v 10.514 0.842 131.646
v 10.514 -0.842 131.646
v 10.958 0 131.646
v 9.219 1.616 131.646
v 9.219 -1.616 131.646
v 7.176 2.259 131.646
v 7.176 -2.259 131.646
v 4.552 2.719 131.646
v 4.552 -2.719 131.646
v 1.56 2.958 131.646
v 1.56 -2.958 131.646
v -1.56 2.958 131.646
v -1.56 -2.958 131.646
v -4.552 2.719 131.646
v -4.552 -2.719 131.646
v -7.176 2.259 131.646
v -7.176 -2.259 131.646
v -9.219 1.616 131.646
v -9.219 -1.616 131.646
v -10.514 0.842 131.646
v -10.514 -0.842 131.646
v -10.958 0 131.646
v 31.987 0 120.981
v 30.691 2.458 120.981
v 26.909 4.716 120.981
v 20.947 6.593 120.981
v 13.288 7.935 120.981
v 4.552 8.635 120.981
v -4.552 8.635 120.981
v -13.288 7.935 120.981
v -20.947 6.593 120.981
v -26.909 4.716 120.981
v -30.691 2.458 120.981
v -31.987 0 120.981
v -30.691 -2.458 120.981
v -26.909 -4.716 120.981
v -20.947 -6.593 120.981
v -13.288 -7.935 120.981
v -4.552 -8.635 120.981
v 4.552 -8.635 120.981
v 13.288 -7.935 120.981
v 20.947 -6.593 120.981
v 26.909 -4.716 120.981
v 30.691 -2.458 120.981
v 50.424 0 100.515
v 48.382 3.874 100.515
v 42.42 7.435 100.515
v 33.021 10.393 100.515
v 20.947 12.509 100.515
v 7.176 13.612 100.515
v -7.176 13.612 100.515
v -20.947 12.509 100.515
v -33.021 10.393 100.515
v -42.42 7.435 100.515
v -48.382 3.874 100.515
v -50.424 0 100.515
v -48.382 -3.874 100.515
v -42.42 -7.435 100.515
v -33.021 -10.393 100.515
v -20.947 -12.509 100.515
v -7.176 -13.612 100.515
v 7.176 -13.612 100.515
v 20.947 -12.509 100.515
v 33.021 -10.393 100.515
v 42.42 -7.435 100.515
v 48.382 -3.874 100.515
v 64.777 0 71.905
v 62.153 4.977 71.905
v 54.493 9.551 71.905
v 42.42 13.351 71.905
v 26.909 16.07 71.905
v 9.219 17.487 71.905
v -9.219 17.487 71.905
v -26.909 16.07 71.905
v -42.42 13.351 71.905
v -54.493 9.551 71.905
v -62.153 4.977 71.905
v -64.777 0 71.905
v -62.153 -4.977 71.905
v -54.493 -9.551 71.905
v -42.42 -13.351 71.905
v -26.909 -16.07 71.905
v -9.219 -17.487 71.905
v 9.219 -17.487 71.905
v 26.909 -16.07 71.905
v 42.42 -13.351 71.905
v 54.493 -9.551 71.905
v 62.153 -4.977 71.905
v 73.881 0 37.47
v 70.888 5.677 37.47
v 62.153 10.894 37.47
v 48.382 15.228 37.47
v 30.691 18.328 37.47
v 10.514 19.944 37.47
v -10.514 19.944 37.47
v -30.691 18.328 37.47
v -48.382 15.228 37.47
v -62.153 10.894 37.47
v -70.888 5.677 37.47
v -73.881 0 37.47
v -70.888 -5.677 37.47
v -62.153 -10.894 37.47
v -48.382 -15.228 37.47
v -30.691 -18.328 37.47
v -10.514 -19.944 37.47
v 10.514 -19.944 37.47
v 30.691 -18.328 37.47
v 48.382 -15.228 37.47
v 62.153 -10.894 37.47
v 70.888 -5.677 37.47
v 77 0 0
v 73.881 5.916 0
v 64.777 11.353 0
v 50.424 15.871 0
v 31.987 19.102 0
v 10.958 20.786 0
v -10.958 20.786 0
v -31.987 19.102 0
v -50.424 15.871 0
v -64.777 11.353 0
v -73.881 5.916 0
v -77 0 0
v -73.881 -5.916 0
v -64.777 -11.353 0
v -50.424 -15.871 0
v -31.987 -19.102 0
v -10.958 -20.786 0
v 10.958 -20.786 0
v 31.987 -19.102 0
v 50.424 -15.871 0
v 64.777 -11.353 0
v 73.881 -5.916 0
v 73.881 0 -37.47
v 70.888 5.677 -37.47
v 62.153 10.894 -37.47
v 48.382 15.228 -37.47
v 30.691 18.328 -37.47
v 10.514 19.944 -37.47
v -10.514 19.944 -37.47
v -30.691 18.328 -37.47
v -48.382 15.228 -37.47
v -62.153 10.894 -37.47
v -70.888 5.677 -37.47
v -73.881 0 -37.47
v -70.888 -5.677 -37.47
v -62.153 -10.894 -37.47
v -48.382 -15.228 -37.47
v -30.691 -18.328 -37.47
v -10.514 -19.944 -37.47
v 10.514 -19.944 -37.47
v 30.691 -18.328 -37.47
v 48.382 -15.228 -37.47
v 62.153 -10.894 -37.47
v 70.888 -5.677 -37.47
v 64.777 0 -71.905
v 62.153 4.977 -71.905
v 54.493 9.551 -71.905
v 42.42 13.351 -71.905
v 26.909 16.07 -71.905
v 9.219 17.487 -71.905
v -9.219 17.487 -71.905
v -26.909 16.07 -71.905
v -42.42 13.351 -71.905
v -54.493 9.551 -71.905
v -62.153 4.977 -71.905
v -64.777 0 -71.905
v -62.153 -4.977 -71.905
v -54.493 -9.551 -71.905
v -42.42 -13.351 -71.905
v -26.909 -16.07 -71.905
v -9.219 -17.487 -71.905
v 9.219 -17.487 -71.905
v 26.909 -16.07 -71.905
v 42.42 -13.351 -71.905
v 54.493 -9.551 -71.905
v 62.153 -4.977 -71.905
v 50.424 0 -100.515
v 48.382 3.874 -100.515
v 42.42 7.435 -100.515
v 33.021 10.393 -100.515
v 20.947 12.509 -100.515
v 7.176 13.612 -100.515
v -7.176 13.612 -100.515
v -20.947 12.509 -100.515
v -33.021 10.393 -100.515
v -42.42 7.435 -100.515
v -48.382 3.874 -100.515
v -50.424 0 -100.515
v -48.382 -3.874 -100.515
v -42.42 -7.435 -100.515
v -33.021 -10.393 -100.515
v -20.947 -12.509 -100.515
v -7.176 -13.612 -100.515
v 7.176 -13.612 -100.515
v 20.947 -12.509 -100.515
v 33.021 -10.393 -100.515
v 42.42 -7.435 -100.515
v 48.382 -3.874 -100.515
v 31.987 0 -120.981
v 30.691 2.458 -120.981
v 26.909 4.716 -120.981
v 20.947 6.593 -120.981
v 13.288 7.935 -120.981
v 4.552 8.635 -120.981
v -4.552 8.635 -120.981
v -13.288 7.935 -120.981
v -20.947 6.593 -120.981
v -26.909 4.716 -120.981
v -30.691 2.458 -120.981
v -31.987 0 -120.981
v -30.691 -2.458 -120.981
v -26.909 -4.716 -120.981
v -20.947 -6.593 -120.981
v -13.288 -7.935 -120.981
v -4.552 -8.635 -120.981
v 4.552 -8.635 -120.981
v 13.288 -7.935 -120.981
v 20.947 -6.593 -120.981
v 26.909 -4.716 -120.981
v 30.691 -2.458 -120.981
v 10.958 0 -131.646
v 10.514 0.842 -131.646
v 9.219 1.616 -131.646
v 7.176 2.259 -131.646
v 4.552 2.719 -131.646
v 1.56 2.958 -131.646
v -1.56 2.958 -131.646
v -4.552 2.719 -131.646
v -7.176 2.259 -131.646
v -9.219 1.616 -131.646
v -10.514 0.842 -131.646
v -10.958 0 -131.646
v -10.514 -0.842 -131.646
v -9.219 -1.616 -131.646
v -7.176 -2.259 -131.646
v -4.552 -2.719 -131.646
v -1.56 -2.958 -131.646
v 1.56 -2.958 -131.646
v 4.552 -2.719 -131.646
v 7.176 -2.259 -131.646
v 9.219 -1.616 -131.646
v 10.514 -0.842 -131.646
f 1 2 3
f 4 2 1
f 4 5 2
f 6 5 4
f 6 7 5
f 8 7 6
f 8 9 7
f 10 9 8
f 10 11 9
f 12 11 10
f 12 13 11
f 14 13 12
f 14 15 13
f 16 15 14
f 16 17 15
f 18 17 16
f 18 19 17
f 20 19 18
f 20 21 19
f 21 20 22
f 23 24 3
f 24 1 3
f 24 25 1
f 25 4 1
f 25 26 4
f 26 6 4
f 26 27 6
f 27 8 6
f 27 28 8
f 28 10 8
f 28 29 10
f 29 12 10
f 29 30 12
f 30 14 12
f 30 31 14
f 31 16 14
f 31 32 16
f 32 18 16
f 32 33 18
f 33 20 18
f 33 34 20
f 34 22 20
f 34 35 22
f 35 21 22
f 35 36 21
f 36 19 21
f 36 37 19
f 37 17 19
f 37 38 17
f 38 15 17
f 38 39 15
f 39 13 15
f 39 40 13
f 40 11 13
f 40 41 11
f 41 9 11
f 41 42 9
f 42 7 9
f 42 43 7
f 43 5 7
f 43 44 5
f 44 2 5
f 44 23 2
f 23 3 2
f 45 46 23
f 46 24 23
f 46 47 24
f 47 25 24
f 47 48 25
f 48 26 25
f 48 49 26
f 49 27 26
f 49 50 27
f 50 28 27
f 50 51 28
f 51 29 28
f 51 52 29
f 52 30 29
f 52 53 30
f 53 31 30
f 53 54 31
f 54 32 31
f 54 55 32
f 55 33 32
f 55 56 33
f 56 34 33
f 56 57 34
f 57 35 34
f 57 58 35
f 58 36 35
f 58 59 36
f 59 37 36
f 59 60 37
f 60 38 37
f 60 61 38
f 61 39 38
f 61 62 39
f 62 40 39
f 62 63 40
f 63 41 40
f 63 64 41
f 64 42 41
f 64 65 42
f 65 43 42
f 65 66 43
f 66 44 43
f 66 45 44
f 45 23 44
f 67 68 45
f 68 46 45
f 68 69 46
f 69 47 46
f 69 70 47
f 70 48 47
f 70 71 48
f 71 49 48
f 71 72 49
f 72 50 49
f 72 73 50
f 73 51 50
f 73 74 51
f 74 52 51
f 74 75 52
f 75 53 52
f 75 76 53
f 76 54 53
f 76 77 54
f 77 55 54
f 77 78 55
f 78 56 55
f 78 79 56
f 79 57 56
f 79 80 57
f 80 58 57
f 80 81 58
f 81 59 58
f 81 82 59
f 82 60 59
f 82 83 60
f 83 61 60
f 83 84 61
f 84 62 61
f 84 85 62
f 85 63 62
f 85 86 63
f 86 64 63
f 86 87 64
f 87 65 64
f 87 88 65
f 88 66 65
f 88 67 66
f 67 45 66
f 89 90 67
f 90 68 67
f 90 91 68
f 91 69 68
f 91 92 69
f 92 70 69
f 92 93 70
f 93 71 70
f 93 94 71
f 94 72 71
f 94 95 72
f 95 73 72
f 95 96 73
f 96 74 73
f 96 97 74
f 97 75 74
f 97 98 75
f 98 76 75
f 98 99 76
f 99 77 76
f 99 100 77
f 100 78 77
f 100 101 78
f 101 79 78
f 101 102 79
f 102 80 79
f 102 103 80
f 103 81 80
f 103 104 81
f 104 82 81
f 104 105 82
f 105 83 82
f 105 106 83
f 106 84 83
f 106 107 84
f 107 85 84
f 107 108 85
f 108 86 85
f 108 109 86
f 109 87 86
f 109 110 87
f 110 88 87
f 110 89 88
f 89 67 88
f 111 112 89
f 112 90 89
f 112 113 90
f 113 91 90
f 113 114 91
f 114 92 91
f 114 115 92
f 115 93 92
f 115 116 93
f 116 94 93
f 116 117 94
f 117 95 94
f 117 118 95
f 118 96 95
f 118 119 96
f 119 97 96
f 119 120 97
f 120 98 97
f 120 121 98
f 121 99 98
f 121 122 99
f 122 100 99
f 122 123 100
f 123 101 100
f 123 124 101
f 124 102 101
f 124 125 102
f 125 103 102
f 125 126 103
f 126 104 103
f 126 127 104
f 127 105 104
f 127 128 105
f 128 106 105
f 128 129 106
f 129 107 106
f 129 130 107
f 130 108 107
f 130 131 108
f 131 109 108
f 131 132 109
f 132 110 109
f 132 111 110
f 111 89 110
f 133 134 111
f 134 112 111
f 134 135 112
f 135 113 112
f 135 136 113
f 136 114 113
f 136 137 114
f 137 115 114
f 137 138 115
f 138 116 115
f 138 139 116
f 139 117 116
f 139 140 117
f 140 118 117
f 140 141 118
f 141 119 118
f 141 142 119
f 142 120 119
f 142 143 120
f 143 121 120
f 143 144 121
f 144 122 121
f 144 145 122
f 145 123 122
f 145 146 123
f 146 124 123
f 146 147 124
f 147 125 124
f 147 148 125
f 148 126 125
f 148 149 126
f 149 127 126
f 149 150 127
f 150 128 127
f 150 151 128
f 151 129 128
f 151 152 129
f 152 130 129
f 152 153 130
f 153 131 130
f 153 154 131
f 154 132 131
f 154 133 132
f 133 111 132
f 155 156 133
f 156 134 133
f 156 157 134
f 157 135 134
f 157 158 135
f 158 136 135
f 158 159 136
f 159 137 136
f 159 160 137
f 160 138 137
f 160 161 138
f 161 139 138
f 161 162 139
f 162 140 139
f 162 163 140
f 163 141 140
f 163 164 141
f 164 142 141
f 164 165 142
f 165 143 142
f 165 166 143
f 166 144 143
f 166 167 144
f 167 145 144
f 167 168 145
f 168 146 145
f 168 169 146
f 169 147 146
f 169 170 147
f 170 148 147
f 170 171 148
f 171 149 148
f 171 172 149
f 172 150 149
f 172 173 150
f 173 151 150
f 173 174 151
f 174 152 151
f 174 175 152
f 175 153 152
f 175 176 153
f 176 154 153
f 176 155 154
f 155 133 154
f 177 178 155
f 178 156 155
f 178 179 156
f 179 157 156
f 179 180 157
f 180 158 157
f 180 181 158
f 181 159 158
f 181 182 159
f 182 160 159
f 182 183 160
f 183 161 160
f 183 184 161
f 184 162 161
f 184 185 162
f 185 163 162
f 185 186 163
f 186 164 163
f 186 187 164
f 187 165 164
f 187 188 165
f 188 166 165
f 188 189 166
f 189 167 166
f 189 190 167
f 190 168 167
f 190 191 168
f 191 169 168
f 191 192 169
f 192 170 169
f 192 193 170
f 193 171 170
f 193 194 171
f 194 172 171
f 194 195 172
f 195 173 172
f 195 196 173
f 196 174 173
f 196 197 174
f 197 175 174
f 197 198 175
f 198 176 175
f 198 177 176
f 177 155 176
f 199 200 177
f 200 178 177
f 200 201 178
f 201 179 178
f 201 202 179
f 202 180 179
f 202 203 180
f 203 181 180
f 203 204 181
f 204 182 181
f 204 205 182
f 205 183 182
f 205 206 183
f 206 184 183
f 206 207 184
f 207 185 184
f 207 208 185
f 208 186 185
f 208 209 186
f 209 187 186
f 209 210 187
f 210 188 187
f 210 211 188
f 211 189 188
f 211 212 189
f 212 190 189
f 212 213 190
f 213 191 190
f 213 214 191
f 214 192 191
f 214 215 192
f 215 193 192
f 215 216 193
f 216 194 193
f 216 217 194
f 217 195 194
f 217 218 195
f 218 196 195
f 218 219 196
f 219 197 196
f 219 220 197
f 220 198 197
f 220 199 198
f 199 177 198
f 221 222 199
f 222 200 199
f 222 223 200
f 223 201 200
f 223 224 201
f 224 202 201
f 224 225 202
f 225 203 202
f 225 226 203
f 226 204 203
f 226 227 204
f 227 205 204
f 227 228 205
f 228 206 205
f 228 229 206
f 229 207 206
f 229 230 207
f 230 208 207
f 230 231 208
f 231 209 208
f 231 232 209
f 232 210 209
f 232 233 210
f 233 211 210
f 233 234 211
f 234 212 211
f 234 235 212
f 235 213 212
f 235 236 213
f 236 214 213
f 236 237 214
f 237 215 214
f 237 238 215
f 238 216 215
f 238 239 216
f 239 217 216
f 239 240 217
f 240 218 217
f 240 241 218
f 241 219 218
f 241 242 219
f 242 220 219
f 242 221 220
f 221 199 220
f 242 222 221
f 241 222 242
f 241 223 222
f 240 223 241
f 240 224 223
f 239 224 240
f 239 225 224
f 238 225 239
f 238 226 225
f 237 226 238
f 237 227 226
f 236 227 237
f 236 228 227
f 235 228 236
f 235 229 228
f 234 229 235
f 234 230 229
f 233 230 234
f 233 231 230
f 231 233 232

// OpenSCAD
// Generated by SolidPython 1.0.1 on 2020-07-29 00:46:49


scale(v = [11, 3, 19]) {
	sphere(r = 7);
}
/***********************************************
*********      SolidPython code:      **********
************************************************
 
# import packages: SolidPython
from solid import *
from solid.utils import *
from itertools import chain, combinations, permutations


class Resize:

    def __init__(self, scad_file):
        self.scad_file = scad_file
        #self.scad_file = import_scad(scad_file)
        # cone/cylinder param:
        self.r1 = 0
        self.r2 = 0
        self.h = 0
        # rectangular prism param:
        self.w = 0
        self.l = 0
        # ellipse param:
        self.r = 0

    # import OpenScad code (file name corresponds to shape)


    # classify shape + parameters
    def assign(self, param1, param2, param3):
        if self.scad_file == 'cone.scad':
            self.r1 = param1
            self.r2 = param2
            self.h = param3
        elif self.scad_file == 'cylinder.scad':
            self.r1 = param1
            self.r2 = param2
            self.h = param3
        elif self.scad_file == 'rectangularPrism.scad':
            self.h = param1
            self.l = param2
            self.w = param3
        else:
            self.r = param1
            self.h = param2

    # resize parameters
    def iterate(self):
        x = range(3, 20, 2)
        i = 1
        if self.scad_file == 'cone.scad':
            tempList = list(permutations(x, 2))
            for temp in tempList:
                param1 = temp[0]
                param2 = temp[1]
                filepath = 'produced_scad_files/' + 'cone' + str(param1) + '_' + str(param2) + '_' + '.scad'
                scad_render_to_file(cylinder(h=param1, r1=param2, r2=0), filepath)

        elif self.scad_file == 'cylinder.scad':
            tempList = list(permutations(x, 3))
            for temp in tempList:
                param1 = temp[0]
                param2 = temp[1]
                filepath = 'produced_scad_files/' + 'cylinder' + str(param1) + '_' + str(param2) + '_' + '.scad'
                scad_render_to_file(cylinder(h=param1, r1=param2, r2=param2), filepath)

        elif self.scad_file == 'rectangularPrism.scad':
            tempList = list(permutations(x, 3))
            for temp in tempList:
                param1 = temp[0]
                param2 = temp[1]
                param3 = temp[2]
                filepath = 'produced_scad_files/' + 'rectangularPrism' + str(param1) + '_' + str(param2) + '_' + str(
                    param3) + '.scad'
                scad_render_to_file(cube(size=(param1, param2, param3)), filepath)

        elif self.scad_file == 'ellipse.scad':
            tempList = list(permutations(x, 4))
            for temp in tempList:
                param1 = temp[0]
                param2 = temp[1]
                param3 = temp[2]
                param4 = temp[3]
                filepath = 'produced_scad_files/' + 'ellipse' + str(param1) + '_' + str(param2) + '_' + str(param3) + '_' + str(param4) + '.scad'
                scad_render_to_file(scale([param1, param2, param3])(sphere(r=param4)), filepath)

    def render_to_scadfile(self):
        scad_render_to_file(scad, 'example.scad') 
 
************************************************/
